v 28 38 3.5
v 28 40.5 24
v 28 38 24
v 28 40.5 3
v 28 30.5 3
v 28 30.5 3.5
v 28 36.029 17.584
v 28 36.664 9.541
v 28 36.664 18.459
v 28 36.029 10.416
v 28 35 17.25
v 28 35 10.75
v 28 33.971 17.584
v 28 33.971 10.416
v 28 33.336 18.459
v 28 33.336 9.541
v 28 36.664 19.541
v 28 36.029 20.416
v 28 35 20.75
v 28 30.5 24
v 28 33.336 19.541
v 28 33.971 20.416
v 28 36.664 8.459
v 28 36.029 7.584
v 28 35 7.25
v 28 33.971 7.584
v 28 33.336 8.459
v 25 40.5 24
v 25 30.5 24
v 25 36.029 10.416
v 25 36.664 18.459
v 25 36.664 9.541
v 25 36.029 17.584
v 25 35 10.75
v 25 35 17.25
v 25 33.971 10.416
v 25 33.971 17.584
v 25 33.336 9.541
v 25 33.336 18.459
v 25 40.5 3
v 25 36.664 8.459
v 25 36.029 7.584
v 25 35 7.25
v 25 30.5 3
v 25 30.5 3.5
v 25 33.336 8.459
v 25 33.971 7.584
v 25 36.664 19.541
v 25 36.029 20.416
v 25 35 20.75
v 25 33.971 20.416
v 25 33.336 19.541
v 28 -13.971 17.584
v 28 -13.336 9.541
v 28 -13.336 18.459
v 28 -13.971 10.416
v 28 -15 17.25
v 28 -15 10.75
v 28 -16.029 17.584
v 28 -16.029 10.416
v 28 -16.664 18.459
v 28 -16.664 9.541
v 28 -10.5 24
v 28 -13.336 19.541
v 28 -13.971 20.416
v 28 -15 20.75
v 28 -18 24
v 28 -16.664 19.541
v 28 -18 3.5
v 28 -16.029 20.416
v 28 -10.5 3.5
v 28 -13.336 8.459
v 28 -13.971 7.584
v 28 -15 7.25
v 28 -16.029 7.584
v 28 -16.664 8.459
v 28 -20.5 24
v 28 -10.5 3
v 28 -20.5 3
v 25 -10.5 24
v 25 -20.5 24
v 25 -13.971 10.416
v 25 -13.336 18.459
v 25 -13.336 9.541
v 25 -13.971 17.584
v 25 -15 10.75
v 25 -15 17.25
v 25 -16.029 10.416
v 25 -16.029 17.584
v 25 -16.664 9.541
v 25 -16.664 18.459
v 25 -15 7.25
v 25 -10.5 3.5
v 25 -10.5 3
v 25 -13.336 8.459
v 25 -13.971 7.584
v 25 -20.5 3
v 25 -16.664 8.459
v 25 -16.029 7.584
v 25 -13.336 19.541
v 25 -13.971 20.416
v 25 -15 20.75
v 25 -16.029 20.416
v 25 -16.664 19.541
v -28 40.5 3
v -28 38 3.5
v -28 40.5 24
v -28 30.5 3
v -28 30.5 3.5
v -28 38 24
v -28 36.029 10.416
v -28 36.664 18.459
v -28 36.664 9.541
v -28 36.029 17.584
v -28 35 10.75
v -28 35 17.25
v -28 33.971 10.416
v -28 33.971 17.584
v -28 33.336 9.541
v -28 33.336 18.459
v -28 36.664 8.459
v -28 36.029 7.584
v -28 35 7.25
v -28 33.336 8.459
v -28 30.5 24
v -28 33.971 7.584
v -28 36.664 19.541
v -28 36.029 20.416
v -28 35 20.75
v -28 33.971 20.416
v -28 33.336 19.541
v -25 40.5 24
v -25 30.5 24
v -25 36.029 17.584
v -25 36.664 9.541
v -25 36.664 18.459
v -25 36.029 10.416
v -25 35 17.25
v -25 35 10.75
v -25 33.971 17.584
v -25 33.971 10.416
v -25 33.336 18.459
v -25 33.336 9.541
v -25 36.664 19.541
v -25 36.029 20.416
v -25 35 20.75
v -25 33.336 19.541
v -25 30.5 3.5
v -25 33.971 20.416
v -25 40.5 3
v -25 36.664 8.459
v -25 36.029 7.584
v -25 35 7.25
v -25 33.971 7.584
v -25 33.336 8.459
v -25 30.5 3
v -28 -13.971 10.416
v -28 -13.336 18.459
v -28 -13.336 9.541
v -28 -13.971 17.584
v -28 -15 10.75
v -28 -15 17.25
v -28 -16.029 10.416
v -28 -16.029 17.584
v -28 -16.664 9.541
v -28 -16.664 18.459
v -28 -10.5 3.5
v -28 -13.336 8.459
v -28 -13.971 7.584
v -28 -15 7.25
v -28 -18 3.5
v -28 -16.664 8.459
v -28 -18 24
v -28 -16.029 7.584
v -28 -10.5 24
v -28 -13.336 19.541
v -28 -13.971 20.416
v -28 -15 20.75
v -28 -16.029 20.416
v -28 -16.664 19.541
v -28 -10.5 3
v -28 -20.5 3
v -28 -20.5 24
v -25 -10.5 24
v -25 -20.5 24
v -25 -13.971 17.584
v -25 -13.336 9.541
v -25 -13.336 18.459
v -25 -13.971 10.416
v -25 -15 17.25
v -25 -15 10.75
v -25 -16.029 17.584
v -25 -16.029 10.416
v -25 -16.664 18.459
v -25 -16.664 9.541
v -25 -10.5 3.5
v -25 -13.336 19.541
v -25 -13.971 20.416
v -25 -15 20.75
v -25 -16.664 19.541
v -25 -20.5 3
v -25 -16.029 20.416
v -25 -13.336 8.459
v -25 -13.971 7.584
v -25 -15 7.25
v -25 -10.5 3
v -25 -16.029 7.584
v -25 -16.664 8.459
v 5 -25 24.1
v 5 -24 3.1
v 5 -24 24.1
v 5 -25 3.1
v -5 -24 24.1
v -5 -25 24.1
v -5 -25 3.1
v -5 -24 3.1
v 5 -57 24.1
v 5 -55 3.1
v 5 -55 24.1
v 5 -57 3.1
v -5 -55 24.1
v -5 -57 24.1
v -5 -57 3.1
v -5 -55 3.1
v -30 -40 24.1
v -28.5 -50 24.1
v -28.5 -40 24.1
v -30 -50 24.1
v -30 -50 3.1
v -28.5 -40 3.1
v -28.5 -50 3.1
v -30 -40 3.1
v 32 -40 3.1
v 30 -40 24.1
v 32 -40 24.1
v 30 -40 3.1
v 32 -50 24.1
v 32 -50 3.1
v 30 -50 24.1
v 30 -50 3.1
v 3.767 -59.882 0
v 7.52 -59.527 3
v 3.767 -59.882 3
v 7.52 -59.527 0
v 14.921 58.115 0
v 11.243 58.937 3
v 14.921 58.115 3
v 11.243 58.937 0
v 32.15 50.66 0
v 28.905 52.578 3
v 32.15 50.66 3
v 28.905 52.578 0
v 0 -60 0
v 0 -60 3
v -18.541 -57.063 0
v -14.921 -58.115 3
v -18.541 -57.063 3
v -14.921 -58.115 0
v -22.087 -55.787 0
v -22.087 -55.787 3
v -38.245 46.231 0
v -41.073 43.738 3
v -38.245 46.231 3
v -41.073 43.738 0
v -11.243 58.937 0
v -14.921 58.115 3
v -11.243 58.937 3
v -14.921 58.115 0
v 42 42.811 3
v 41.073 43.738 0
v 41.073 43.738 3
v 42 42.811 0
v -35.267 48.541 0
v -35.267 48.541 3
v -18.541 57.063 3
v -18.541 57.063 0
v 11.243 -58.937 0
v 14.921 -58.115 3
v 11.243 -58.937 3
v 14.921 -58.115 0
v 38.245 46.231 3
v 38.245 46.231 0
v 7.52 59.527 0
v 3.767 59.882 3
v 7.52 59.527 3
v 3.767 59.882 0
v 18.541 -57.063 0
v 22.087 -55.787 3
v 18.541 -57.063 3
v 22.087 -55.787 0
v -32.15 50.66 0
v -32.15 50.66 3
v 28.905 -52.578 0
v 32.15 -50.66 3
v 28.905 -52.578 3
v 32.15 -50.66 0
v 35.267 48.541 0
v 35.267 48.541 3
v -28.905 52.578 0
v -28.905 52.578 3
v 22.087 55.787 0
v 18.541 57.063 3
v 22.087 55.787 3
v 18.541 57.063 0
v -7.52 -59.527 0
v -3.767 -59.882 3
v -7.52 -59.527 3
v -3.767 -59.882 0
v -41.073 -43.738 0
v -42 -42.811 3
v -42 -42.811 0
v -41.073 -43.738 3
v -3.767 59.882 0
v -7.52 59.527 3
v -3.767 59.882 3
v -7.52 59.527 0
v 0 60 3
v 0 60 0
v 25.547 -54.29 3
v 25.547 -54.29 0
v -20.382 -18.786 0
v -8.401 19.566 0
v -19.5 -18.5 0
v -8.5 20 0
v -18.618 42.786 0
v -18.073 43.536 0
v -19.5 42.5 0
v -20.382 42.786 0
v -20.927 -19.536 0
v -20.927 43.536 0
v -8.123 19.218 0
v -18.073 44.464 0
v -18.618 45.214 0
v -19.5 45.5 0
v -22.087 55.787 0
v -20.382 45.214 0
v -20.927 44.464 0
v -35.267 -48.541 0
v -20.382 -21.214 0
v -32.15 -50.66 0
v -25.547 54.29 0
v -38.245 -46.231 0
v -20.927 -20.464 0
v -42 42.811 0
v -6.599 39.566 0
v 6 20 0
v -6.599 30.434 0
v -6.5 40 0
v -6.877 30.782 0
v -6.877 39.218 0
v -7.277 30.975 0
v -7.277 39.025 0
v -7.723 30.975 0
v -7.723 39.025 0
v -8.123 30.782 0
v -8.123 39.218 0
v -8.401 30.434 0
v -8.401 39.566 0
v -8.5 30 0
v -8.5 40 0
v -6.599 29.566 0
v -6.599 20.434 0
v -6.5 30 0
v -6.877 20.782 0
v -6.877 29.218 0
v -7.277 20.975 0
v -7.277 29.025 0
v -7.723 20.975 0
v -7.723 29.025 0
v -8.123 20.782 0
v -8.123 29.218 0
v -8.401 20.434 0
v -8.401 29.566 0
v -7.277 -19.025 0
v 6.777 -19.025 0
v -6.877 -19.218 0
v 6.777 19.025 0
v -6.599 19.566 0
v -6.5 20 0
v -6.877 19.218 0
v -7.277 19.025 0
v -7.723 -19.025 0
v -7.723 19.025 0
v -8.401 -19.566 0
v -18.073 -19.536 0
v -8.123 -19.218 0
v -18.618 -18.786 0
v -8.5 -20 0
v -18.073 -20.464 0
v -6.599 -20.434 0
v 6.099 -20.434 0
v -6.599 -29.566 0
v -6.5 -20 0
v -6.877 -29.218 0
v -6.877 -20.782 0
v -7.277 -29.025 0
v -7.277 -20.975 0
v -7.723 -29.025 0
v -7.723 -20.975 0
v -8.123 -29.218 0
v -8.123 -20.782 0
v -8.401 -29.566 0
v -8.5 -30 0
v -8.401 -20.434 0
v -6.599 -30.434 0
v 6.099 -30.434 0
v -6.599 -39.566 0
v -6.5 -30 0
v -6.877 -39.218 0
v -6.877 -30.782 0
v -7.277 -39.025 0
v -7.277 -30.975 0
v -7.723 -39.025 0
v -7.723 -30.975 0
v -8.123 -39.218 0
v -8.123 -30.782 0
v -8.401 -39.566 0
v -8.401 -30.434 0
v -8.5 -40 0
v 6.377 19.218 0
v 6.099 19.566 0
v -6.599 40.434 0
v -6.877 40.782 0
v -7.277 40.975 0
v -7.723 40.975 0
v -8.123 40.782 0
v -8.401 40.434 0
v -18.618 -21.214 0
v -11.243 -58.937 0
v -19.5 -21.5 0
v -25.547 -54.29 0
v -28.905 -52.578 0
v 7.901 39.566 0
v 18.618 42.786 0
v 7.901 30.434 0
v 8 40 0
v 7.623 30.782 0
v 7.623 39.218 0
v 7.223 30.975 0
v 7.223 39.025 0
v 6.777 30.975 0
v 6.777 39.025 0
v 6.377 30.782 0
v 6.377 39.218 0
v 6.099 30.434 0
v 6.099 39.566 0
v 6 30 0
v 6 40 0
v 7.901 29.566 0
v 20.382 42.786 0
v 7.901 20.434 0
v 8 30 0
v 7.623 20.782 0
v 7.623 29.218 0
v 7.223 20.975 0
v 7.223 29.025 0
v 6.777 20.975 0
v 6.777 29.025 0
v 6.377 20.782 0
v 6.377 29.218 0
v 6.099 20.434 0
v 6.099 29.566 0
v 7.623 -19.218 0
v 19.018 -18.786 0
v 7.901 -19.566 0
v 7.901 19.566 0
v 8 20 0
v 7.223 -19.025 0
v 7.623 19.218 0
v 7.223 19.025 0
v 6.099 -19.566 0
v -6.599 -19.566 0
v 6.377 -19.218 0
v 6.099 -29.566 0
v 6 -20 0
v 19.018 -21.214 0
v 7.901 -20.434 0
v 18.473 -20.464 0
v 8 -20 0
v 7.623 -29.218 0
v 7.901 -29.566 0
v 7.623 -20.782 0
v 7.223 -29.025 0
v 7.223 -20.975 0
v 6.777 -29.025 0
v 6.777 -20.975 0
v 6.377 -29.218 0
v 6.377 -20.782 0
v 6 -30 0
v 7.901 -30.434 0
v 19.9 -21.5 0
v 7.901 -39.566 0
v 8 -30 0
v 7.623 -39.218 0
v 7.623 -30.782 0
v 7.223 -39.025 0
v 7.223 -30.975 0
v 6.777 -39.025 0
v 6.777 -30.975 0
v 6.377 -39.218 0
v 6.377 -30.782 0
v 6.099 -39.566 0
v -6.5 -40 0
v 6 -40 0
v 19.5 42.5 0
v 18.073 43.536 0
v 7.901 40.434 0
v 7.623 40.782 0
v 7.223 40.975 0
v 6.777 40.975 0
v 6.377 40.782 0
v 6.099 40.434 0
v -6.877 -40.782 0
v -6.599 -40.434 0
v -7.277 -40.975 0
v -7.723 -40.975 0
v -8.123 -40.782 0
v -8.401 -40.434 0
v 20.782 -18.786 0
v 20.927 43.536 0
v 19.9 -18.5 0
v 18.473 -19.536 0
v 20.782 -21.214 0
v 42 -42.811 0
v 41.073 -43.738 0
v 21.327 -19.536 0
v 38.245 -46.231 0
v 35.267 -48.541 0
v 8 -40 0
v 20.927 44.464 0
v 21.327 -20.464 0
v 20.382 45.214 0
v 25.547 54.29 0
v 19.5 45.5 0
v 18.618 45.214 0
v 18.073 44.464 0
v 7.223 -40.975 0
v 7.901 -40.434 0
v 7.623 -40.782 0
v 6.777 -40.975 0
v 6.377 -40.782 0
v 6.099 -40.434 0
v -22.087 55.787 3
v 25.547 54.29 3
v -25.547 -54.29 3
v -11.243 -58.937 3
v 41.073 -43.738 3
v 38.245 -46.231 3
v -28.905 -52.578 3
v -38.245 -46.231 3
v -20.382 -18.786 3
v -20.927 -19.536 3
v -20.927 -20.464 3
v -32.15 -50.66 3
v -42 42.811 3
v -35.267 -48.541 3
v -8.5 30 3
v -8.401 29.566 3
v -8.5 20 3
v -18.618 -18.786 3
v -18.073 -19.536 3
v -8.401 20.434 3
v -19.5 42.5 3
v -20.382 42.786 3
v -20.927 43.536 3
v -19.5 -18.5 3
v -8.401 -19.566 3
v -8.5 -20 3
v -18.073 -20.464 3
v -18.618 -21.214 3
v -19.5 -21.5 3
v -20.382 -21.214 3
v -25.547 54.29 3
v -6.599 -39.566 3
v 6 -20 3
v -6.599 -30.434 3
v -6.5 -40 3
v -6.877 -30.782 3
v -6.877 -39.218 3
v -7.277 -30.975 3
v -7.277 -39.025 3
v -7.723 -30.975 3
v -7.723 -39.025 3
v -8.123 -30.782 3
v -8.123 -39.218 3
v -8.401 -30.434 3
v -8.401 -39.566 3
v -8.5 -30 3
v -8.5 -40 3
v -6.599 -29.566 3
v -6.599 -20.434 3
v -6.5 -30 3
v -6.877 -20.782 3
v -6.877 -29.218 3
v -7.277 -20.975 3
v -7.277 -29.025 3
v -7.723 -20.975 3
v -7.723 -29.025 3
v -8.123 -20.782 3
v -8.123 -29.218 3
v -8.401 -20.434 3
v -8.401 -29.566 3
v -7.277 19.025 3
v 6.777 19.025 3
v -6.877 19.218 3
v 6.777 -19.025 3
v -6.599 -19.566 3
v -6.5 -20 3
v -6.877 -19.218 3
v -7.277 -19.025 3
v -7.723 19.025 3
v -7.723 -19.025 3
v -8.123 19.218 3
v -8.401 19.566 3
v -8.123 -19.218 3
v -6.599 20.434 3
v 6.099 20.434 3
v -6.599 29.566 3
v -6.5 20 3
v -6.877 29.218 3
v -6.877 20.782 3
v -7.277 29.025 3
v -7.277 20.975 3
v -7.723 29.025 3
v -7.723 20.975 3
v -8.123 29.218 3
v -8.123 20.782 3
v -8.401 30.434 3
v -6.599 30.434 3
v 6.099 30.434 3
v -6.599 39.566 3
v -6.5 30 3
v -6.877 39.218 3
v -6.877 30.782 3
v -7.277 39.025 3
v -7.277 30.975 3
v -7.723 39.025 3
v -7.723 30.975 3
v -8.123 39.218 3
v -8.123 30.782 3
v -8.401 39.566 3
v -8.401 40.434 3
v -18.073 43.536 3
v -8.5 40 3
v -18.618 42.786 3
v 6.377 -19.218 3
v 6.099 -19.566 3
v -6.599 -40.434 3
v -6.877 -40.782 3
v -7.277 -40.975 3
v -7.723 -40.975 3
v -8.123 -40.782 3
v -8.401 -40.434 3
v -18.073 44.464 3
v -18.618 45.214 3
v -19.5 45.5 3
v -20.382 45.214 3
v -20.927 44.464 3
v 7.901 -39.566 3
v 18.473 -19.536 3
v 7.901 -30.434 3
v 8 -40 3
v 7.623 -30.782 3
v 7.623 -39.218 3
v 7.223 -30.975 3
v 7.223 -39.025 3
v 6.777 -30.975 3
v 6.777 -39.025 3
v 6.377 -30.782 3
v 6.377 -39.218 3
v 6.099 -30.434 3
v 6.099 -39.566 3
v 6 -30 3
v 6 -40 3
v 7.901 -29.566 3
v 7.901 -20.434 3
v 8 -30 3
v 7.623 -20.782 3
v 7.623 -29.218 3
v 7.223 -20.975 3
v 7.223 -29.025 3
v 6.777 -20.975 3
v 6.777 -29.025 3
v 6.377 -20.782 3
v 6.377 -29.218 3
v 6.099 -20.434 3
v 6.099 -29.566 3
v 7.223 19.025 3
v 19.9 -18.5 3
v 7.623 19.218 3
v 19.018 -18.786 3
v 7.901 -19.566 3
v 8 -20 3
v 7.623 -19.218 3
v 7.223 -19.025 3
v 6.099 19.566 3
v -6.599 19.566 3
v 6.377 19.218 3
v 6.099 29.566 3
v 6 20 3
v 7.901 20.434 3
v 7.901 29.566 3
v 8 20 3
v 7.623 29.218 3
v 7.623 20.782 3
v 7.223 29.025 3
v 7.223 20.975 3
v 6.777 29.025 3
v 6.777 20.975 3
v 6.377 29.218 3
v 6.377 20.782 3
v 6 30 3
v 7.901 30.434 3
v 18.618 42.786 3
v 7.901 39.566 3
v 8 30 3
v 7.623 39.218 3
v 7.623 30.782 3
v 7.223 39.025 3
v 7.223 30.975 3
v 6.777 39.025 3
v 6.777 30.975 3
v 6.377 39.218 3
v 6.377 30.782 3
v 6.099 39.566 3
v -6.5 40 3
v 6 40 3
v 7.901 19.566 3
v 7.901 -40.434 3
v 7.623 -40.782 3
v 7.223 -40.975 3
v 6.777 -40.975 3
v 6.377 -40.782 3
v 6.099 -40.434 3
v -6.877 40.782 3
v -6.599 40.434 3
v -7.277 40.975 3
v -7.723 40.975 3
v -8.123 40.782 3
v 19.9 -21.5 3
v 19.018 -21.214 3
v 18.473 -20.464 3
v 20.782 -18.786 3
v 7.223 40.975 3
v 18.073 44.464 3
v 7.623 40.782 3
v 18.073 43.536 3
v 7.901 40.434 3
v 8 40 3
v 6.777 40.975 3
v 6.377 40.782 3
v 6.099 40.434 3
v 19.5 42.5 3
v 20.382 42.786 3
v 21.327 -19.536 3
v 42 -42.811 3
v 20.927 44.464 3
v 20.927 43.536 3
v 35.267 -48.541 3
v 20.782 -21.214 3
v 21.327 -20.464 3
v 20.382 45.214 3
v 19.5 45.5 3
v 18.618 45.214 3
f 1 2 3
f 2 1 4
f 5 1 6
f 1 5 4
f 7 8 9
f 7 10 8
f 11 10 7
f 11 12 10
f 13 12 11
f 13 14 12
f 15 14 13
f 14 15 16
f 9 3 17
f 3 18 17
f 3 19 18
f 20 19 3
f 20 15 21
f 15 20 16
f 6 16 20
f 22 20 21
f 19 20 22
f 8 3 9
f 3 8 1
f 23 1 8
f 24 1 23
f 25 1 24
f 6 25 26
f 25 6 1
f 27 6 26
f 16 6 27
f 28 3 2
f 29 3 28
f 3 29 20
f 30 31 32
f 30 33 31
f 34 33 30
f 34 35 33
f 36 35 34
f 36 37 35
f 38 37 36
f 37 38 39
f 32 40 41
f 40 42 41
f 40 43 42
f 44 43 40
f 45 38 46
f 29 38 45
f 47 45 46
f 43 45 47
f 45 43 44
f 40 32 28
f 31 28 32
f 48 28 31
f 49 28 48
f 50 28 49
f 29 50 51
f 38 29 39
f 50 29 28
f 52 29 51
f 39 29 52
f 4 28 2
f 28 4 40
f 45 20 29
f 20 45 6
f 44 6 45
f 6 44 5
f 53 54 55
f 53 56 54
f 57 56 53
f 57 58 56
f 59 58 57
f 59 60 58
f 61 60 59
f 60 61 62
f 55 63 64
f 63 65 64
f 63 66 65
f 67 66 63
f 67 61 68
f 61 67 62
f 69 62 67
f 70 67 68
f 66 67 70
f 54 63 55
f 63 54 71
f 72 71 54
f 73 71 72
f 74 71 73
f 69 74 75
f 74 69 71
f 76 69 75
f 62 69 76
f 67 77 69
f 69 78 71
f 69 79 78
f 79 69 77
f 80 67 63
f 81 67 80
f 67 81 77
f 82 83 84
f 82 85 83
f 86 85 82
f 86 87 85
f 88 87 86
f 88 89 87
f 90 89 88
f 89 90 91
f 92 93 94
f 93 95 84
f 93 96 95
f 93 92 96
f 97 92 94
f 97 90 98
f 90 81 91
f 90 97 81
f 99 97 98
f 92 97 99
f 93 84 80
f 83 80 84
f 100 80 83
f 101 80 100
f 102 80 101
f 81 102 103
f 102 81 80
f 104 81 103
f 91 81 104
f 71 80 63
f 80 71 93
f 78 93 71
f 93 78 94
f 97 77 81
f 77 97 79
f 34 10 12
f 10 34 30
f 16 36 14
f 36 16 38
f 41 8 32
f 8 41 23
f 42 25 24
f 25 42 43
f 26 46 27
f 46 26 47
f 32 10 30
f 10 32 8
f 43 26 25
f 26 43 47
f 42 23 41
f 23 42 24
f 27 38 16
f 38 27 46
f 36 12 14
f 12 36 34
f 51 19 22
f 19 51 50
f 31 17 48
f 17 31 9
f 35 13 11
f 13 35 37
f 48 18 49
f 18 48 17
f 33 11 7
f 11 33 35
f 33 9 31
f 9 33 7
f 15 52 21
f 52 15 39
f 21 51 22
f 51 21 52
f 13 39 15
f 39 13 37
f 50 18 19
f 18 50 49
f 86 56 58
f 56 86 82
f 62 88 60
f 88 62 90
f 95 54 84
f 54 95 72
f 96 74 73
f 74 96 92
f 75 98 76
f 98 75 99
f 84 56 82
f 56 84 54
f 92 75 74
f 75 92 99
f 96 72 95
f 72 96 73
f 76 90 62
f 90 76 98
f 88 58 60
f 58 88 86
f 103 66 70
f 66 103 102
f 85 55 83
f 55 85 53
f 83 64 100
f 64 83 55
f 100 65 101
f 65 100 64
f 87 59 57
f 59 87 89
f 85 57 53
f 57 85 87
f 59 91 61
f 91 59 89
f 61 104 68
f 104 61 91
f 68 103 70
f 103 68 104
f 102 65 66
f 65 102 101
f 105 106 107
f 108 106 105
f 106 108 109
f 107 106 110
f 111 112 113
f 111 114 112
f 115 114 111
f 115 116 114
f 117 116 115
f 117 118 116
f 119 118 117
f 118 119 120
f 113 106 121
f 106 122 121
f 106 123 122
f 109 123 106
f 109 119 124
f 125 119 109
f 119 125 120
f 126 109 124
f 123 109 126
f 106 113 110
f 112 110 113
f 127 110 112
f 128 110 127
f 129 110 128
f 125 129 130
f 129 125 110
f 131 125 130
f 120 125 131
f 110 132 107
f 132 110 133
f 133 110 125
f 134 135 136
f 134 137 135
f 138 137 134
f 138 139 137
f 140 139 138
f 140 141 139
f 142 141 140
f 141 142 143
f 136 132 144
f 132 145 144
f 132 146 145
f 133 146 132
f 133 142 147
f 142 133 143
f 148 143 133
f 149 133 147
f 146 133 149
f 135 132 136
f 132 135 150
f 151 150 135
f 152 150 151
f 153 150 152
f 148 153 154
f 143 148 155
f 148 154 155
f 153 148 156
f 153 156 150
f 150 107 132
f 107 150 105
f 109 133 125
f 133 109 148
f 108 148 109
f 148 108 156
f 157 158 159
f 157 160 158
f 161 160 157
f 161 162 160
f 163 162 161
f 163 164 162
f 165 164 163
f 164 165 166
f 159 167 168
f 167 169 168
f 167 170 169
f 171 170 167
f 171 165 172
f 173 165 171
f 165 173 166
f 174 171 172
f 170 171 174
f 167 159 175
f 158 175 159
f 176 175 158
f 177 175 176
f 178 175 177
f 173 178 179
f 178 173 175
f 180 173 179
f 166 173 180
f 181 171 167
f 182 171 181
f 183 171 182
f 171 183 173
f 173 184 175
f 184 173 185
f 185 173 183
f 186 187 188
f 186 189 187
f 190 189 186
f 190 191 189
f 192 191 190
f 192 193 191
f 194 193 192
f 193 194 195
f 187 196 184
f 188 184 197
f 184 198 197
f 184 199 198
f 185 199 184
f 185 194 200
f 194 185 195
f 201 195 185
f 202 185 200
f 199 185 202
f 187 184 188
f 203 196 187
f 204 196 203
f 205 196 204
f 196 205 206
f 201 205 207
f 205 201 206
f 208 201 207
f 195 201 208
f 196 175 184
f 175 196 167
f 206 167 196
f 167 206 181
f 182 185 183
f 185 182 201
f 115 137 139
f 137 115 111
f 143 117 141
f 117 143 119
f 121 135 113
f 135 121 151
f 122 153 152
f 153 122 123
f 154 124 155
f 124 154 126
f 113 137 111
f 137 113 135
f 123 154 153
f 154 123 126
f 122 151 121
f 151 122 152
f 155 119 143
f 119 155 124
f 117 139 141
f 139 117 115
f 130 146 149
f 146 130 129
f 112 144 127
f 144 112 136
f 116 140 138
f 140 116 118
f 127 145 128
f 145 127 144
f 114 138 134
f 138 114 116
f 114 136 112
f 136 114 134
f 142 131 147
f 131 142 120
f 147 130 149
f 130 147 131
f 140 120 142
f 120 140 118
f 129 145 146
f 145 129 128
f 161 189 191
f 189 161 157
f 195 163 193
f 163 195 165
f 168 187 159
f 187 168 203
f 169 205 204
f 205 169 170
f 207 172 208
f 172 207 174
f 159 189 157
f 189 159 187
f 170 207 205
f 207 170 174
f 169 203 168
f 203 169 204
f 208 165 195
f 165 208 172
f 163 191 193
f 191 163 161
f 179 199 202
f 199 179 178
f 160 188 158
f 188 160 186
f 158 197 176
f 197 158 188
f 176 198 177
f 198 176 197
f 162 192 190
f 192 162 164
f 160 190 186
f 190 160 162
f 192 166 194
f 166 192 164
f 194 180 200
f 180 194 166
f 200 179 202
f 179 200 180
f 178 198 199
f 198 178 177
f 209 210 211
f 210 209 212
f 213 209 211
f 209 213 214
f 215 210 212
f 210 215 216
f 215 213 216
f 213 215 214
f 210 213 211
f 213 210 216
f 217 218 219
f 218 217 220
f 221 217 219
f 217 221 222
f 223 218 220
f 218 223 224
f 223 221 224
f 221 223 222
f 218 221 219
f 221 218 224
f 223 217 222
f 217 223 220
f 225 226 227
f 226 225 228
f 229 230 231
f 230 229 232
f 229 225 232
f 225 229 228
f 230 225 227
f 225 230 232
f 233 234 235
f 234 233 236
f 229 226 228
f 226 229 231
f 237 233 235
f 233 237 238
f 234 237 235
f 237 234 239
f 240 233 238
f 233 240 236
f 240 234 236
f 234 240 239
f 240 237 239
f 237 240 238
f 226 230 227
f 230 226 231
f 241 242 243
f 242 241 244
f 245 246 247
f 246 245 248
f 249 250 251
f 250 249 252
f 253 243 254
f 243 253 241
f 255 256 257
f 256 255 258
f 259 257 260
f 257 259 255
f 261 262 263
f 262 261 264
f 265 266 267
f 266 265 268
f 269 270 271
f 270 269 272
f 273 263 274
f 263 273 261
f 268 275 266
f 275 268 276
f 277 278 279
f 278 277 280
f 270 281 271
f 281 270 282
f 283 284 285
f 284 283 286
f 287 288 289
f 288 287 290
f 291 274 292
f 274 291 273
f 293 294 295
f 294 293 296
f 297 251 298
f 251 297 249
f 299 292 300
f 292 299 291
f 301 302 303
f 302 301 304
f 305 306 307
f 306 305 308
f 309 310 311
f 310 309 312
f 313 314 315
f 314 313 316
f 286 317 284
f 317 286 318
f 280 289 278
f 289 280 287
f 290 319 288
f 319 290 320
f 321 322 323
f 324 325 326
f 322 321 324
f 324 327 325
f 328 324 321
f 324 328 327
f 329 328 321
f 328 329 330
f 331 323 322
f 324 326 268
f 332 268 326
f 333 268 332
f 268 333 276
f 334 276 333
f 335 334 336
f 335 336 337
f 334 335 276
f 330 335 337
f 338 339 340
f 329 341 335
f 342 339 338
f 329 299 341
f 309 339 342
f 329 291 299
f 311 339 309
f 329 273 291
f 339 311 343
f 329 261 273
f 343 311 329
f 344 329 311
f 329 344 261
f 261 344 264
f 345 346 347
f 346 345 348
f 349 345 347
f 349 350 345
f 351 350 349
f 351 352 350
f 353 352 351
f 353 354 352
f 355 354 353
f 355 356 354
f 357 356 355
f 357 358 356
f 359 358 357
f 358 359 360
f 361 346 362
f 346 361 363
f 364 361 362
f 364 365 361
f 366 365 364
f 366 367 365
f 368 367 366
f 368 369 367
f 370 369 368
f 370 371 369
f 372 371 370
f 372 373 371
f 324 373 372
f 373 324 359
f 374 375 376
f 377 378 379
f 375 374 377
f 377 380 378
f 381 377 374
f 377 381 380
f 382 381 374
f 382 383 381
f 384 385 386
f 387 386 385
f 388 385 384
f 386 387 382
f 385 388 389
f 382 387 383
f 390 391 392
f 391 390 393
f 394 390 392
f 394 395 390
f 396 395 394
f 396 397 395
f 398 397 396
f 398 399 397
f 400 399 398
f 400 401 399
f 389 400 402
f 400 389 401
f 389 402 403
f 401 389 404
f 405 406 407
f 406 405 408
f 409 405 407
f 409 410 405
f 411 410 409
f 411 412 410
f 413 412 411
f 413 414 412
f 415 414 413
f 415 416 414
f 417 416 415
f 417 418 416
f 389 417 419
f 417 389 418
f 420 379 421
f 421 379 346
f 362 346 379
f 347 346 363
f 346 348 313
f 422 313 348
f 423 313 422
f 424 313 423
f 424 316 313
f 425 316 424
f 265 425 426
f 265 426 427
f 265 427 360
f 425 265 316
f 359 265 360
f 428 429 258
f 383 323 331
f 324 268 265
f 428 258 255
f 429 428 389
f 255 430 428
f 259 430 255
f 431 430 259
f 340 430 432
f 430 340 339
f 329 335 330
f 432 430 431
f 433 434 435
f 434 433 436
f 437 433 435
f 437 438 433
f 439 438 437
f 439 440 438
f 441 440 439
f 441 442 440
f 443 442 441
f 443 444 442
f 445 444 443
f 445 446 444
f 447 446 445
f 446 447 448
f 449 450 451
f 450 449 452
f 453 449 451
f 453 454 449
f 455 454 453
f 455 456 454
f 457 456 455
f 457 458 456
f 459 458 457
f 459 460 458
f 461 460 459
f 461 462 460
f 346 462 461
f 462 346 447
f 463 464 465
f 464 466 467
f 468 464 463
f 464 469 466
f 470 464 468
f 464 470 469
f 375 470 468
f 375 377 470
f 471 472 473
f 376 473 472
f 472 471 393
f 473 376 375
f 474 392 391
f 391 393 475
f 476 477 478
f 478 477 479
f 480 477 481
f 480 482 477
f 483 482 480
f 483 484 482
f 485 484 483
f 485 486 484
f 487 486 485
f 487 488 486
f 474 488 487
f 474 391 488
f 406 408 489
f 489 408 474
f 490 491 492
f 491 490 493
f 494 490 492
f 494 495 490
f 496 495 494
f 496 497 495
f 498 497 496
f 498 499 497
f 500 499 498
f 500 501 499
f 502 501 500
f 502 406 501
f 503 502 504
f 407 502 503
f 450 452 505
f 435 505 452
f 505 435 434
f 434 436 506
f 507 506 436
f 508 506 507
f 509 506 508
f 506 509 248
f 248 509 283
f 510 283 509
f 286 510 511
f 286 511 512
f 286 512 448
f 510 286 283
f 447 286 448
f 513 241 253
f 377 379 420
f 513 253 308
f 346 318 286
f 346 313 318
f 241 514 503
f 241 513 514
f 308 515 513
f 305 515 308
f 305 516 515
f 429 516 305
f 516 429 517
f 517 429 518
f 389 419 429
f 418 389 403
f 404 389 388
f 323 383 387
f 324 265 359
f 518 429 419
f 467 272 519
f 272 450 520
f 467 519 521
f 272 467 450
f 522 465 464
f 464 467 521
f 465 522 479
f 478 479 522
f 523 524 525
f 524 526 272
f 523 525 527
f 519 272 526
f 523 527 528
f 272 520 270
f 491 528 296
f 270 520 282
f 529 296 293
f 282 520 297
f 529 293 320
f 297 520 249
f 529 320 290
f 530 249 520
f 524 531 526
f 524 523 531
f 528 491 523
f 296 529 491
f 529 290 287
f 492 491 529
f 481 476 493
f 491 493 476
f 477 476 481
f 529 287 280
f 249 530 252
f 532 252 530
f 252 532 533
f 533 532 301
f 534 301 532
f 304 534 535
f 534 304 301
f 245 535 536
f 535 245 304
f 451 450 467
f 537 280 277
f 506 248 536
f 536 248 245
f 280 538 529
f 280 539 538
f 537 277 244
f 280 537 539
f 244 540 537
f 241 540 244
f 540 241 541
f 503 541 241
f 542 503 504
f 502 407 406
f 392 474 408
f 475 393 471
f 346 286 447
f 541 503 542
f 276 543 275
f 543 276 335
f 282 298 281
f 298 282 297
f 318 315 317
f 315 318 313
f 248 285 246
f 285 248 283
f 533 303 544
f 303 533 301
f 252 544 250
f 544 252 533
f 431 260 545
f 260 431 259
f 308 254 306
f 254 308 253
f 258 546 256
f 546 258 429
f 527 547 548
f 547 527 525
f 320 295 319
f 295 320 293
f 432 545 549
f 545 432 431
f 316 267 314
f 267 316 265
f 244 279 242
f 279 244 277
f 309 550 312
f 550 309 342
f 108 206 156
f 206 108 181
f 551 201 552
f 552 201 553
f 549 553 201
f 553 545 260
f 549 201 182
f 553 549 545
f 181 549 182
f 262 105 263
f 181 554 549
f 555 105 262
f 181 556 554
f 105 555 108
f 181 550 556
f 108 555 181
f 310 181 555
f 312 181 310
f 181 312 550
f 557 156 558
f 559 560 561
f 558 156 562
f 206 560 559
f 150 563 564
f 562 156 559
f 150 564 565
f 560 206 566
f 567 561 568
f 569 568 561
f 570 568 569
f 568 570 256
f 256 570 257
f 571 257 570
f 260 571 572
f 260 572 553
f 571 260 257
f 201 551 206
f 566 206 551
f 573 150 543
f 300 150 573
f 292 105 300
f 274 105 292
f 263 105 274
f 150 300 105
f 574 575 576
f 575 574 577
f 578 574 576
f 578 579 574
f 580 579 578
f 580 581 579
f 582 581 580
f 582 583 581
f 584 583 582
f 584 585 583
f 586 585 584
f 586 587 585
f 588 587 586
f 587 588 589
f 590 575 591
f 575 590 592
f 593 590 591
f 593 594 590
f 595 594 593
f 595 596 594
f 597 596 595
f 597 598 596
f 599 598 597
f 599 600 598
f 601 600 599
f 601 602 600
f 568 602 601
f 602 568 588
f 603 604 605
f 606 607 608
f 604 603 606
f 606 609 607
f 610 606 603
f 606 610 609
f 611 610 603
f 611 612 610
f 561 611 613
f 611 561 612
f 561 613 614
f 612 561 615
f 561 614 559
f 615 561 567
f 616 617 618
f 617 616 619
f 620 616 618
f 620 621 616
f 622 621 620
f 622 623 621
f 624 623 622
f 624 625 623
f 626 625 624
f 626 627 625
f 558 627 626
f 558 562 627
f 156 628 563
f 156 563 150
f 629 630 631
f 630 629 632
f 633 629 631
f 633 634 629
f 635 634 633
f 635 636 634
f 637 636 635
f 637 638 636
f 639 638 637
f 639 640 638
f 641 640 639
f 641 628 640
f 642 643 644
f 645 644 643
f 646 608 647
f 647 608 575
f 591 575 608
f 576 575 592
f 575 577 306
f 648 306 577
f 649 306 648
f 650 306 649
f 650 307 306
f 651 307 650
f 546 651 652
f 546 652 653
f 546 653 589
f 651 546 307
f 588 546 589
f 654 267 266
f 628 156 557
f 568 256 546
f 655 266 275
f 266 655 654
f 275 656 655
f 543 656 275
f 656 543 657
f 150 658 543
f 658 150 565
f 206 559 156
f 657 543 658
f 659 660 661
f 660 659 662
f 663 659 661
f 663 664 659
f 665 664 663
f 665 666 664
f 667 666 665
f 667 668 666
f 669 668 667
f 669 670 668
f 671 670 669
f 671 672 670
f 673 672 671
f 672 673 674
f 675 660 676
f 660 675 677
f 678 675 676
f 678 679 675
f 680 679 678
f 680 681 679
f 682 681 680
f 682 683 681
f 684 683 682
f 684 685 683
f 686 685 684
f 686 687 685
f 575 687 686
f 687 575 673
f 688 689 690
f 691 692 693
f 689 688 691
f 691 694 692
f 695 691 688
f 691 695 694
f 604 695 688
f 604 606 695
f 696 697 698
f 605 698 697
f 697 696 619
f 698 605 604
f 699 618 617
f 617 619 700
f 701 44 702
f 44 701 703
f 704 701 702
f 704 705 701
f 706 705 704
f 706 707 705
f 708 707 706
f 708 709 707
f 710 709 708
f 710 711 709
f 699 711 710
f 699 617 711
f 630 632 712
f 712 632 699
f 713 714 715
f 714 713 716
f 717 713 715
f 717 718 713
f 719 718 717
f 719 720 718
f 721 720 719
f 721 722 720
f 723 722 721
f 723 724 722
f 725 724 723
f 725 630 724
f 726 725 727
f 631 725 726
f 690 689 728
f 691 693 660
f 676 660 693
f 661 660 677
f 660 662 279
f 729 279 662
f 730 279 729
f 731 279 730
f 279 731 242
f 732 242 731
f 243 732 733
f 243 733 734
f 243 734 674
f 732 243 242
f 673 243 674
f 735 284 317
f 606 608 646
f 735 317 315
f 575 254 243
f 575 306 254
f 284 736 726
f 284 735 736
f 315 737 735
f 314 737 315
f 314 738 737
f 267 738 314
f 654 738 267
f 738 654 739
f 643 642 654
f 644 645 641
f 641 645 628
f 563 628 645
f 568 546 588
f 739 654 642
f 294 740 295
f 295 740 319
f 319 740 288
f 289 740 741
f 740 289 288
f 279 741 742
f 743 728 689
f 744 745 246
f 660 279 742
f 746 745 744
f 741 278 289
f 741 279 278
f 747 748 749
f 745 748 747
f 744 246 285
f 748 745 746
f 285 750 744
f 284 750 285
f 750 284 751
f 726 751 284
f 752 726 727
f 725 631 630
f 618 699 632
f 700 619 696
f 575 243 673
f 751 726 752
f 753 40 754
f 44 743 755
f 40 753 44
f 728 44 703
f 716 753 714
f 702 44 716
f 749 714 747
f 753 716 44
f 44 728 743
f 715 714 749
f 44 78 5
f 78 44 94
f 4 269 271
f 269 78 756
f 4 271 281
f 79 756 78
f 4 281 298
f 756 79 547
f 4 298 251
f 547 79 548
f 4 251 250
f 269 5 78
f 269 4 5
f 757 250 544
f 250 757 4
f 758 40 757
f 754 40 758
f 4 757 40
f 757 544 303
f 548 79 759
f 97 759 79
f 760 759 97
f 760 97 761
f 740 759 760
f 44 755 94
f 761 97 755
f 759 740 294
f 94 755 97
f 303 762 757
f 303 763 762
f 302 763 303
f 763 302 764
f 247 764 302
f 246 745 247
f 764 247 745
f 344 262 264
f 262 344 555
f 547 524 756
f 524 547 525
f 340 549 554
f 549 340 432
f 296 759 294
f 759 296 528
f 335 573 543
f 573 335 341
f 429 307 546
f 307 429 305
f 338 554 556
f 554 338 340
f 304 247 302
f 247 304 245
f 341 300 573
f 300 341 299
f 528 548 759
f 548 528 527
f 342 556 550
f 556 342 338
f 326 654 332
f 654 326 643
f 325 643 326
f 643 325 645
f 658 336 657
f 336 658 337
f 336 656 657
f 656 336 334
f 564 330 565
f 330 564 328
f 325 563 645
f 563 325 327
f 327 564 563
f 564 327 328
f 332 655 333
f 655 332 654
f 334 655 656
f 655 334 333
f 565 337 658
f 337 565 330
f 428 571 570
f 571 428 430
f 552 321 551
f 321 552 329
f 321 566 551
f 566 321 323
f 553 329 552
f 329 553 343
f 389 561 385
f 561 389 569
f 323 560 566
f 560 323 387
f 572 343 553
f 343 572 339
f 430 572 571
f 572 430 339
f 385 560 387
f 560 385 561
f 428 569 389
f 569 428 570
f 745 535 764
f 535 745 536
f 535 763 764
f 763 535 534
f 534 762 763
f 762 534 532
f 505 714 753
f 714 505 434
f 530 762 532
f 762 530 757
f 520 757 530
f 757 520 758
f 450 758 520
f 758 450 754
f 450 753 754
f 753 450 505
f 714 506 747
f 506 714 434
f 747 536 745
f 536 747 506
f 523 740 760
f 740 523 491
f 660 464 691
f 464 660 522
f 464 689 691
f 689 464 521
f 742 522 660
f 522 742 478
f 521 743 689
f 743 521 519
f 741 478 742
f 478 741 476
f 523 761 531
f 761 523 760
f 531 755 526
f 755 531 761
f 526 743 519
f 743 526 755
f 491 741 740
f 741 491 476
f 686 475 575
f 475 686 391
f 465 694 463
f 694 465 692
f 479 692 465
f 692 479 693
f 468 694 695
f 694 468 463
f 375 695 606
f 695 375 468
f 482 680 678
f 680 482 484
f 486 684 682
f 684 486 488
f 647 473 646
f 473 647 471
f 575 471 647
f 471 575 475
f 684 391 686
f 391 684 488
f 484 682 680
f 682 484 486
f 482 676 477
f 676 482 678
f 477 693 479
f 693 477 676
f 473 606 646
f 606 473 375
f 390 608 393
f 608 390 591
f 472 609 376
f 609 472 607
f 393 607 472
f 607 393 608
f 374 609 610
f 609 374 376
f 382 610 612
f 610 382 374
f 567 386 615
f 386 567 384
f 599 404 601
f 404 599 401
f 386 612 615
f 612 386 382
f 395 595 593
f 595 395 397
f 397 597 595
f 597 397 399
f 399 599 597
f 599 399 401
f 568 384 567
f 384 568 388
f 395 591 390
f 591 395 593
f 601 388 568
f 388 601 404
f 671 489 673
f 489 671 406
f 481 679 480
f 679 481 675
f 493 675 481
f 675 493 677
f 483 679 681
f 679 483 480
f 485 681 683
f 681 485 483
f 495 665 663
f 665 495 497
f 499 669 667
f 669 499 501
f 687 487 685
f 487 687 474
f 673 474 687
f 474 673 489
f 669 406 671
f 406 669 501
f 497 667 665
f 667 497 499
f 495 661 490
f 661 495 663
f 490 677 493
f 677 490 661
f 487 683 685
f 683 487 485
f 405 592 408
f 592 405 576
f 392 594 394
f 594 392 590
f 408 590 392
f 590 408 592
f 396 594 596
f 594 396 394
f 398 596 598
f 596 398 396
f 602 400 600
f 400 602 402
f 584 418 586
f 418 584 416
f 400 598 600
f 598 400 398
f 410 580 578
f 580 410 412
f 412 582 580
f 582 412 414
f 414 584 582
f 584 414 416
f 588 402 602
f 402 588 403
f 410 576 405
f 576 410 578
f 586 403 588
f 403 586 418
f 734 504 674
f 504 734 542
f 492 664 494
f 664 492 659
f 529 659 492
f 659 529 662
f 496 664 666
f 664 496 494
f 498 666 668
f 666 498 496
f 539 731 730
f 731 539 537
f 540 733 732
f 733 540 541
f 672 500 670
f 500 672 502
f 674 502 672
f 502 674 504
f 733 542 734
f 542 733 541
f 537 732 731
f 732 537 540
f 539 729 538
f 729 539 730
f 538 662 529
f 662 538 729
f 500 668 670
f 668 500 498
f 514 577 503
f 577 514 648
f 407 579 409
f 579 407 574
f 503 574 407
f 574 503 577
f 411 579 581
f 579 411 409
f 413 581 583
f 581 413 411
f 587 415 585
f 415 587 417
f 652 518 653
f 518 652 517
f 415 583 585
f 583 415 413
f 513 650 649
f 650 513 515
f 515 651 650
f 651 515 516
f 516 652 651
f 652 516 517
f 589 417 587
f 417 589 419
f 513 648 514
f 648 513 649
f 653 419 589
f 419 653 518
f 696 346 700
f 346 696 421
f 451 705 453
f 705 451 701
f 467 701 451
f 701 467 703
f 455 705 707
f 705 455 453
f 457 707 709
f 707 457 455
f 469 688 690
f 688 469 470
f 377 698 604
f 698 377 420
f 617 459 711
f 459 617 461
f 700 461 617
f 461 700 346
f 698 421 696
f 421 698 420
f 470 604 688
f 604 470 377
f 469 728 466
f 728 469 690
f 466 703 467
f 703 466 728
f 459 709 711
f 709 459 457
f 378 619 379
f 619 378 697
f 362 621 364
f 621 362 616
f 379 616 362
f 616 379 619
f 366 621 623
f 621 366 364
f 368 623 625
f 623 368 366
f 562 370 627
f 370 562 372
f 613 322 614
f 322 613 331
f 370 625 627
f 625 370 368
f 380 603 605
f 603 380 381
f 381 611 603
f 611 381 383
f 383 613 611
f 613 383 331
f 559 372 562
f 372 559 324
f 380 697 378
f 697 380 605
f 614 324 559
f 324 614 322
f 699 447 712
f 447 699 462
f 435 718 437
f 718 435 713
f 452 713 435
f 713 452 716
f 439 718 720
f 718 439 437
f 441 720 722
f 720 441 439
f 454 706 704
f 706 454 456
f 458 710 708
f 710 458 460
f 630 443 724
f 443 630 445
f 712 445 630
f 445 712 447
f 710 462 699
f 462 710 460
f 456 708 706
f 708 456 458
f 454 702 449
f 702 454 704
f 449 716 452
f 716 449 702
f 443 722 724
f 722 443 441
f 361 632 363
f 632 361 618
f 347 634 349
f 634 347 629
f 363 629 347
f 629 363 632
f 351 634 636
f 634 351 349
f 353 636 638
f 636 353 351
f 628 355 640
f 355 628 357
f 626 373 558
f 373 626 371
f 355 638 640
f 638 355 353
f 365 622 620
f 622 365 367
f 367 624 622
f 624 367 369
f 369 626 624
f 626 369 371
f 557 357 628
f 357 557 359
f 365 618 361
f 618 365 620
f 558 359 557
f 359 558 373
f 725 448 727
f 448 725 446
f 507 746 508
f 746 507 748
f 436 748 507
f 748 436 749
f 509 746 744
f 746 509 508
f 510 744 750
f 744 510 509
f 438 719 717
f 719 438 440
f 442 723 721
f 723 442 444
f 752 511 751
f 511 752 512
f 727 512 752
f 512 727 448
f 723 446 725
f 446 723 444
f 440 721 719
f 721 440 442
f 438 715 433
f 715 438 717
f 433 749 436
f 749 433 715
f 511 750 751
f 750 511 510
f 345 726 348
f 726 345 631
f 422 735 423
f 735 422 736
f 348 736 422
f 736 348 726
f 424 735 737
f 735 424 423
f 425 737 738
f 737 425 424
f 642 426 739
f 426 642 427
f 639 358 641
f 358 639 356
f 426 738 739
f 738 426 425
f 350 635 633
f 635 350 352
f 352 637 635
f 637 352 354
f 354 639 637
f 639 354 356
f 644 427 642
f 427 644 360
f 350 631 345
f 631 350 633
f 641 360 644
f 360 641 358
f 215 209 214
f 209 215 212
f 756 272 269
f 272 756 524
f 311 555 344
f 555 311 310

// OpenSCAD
fa = 100;
module servomask() { 
  module hole(pos) {
    rotate(a=[0,90,0]) translate(pos) cylinder(r=1.75, h=20, $fn=fa/10);
  }
  union() {
    translate([0,10,0]) union() {
      translate([-20, -20.5, -10.5]) cube([40, 41, 21]);
      translate([7,-28,-10.5]) cube([5, 56, 21]);
      translate([12,-28,-1]) cube([1, 56, 2]);
      hole([5,25,0]);
      hole([-5,25,0]);
      hole([5,-25,0]);
      hole([-5,-25,0]);
    }
    rotate(a=[0,90,0]) translate([0,0,20]) cylinder(r=3, h=7, $fn=fa/10);
  }
}

module microswitchmask() {
  module hole(pos) {
    translate(pos) rotate(a=[90,0,0]) cylinder(r=1, h=20, $fn=fa/10);
  }
  module leg(pos) {
    translate(pos) rotate(a=[0,90,0]) cylinder(r=0.5, h=3.5, $fn=fa/10);
  }
  union() {
    translate([-3.5,-3,-6.5]) cube([7,6,13]);
    rotate([0,10,0]) translate([-4.5,-1.5,-8]) cube([0.25,3,13]);
    hole([2,10,6.5/2]);
    hole([2,10,-6.5/2]);
    leg([3.5,0,0]);
    leg([3.5,0,-5]);
    leg([3.5,0,5]);
  }
}

module boardmask() {
  module stand(pos) {
    translate(pos) rotate(a=[0,0,0]) cylinder(r=1.5, h=60, $fn=fa/10);
  }
  union() {
    translate([-36, -23.5, -1.5]) cube([72, 47, 10]);
    stand([32,19.5,-50]);
    stand([-32,19.5,-50]);
    stand([32,-19.5,-50]);
    stand([-32,-19.9,-50]);
  }
}

module test() {
  difference() {
    translate([-26/2, -28, 0]) cube([26, 63.4, 4]);
    rotate(a=[0, 90, 0]) translate([-18,0,0]) servomask();
    translate([0,32,5]) rotate(a=[90, 0, -90]) microswitchmask();
    translate([8,23,-1]) cube([10,25,6]);
    mirror([1,0,0]) translate([8,23,-1]) cube([10,25,6]);
    mirror([0,1,0]) translate([8,23,-1]) cube([10,25,6]);
    mirror([0,1,0]) mirror([1,0,0]) translate([8,23,-1]) cube([10,25,6]);
  }
}

module castermask() {
  module hole(pos) {
    translate(pos) cylinder(r=1, h=10, $fn=fa/7);
  }
  union() {
    difference() {
      union() {
        translate([0,0,-5]) sphere(r=9, $fn=fa/2);
        translate([0,0,-5]) cylinder(r=10, h=6, $fn=fa/2);
      }
      translate([-10,-10,0]) cube([20, 20, 10]);
    }
    hole([7,0,0]); //15mm appart
    hole([-7.5,0,0]); //15mm appart
  }
}

module lipomask() {
  translate([-18,-34,0]) cube([36,68,15]);
}
module batterymask() {
  union() {
    translate([-28.5,-14,0]) cube([57,28,32]);
    translate([28.5,-15,3]) cube([8,13,26]);
  }
}

module wheelmask() {
  translate([-5,-50,-30]) cube([50,100,60]);
}

module base() {
  difference() {
    translate([-40, -78, 0]) cube([80,150,30]);
    translate([-37, -75, 3]) cube([73,144,30]);
    #translate([0,40,-0.5]) castermask();
    #translate([0,30,5]) boardmask();
    #translate([25,-25,14]) servomask();
    #translate([-25,-25,14]) rotate(a=[0,180,0]) servomask();
    #translate([0,0,5]) batterymask();
  }
}

module roundbase1() {
  difference() {
    cylinder(r=80, h=3, $fn=fa);
    #translate([38, 0, 14]) servomask();
    #translate([-38, 0, 14]) rotate(a=[0,180,0]) servomask();
    #translate([0, -45, 5]) boardmask();
    #translate([0, 15, 3.1]) rotate(a=[0,0,90]) batterymask();
    #translate([0, 15, 21.1]) rotate(a=[0,90,0]) lipomask();
  }
}

module servo() {
  difference() {
    union() {
      translate([4, 30.5, -13]) cube([3,10,23]);
      translate([4, -20.5, -13]) cube([3,10,23]);
    }
    servomask();
  }
}

module battery() {
  difference() {
    union() {
      translate([-5,14,0]) cube([10,2,21]);
      translate([-5,-17,0]) cube([10,2,21]);
      translate([-30,-10,0]) cube([2,10,21]);
      translate([30,-10,0]) cube([2,10,21]);
    }
    #rotate(a=[0,0,180]) batterymask();
  }
}

module roundbase2() {
  difference() {
    union() {
      cylinder(r=60, h=3, $fn=fa);
      translate([21, 0, 14]) servo();
      mirror([1,0,0]) translate([21, 0, 14]) servo();
      translate([0, -40, 3.1]) rotate(a=[0,0,0]) battery();
    }
    translate([0, 12, 30]) rotate(a=[0,0,90]) boardmask();
    #translate([0, -40, 21.1]) rotate(a=[0,90,90]) lipomask();
    translate([47, 0, 10]) rotate(a=[0,0,0]) wheelmask();
    translate([-47, 0, 10]) rotate(a=[0,0,180]) wheelmask();
    translate([0, -20, 0]) castermask();
    translate([0, -30, 0]) castermask();
    translate([0, -40, 0]) castermask();
    translate([0, 20, 0]) castermask();
    translate([0, 30, 0]) castermask();
    translate([0, 40, 0]) castermask();
  }
}

//base();
//roundbase1();
roundbase2();
